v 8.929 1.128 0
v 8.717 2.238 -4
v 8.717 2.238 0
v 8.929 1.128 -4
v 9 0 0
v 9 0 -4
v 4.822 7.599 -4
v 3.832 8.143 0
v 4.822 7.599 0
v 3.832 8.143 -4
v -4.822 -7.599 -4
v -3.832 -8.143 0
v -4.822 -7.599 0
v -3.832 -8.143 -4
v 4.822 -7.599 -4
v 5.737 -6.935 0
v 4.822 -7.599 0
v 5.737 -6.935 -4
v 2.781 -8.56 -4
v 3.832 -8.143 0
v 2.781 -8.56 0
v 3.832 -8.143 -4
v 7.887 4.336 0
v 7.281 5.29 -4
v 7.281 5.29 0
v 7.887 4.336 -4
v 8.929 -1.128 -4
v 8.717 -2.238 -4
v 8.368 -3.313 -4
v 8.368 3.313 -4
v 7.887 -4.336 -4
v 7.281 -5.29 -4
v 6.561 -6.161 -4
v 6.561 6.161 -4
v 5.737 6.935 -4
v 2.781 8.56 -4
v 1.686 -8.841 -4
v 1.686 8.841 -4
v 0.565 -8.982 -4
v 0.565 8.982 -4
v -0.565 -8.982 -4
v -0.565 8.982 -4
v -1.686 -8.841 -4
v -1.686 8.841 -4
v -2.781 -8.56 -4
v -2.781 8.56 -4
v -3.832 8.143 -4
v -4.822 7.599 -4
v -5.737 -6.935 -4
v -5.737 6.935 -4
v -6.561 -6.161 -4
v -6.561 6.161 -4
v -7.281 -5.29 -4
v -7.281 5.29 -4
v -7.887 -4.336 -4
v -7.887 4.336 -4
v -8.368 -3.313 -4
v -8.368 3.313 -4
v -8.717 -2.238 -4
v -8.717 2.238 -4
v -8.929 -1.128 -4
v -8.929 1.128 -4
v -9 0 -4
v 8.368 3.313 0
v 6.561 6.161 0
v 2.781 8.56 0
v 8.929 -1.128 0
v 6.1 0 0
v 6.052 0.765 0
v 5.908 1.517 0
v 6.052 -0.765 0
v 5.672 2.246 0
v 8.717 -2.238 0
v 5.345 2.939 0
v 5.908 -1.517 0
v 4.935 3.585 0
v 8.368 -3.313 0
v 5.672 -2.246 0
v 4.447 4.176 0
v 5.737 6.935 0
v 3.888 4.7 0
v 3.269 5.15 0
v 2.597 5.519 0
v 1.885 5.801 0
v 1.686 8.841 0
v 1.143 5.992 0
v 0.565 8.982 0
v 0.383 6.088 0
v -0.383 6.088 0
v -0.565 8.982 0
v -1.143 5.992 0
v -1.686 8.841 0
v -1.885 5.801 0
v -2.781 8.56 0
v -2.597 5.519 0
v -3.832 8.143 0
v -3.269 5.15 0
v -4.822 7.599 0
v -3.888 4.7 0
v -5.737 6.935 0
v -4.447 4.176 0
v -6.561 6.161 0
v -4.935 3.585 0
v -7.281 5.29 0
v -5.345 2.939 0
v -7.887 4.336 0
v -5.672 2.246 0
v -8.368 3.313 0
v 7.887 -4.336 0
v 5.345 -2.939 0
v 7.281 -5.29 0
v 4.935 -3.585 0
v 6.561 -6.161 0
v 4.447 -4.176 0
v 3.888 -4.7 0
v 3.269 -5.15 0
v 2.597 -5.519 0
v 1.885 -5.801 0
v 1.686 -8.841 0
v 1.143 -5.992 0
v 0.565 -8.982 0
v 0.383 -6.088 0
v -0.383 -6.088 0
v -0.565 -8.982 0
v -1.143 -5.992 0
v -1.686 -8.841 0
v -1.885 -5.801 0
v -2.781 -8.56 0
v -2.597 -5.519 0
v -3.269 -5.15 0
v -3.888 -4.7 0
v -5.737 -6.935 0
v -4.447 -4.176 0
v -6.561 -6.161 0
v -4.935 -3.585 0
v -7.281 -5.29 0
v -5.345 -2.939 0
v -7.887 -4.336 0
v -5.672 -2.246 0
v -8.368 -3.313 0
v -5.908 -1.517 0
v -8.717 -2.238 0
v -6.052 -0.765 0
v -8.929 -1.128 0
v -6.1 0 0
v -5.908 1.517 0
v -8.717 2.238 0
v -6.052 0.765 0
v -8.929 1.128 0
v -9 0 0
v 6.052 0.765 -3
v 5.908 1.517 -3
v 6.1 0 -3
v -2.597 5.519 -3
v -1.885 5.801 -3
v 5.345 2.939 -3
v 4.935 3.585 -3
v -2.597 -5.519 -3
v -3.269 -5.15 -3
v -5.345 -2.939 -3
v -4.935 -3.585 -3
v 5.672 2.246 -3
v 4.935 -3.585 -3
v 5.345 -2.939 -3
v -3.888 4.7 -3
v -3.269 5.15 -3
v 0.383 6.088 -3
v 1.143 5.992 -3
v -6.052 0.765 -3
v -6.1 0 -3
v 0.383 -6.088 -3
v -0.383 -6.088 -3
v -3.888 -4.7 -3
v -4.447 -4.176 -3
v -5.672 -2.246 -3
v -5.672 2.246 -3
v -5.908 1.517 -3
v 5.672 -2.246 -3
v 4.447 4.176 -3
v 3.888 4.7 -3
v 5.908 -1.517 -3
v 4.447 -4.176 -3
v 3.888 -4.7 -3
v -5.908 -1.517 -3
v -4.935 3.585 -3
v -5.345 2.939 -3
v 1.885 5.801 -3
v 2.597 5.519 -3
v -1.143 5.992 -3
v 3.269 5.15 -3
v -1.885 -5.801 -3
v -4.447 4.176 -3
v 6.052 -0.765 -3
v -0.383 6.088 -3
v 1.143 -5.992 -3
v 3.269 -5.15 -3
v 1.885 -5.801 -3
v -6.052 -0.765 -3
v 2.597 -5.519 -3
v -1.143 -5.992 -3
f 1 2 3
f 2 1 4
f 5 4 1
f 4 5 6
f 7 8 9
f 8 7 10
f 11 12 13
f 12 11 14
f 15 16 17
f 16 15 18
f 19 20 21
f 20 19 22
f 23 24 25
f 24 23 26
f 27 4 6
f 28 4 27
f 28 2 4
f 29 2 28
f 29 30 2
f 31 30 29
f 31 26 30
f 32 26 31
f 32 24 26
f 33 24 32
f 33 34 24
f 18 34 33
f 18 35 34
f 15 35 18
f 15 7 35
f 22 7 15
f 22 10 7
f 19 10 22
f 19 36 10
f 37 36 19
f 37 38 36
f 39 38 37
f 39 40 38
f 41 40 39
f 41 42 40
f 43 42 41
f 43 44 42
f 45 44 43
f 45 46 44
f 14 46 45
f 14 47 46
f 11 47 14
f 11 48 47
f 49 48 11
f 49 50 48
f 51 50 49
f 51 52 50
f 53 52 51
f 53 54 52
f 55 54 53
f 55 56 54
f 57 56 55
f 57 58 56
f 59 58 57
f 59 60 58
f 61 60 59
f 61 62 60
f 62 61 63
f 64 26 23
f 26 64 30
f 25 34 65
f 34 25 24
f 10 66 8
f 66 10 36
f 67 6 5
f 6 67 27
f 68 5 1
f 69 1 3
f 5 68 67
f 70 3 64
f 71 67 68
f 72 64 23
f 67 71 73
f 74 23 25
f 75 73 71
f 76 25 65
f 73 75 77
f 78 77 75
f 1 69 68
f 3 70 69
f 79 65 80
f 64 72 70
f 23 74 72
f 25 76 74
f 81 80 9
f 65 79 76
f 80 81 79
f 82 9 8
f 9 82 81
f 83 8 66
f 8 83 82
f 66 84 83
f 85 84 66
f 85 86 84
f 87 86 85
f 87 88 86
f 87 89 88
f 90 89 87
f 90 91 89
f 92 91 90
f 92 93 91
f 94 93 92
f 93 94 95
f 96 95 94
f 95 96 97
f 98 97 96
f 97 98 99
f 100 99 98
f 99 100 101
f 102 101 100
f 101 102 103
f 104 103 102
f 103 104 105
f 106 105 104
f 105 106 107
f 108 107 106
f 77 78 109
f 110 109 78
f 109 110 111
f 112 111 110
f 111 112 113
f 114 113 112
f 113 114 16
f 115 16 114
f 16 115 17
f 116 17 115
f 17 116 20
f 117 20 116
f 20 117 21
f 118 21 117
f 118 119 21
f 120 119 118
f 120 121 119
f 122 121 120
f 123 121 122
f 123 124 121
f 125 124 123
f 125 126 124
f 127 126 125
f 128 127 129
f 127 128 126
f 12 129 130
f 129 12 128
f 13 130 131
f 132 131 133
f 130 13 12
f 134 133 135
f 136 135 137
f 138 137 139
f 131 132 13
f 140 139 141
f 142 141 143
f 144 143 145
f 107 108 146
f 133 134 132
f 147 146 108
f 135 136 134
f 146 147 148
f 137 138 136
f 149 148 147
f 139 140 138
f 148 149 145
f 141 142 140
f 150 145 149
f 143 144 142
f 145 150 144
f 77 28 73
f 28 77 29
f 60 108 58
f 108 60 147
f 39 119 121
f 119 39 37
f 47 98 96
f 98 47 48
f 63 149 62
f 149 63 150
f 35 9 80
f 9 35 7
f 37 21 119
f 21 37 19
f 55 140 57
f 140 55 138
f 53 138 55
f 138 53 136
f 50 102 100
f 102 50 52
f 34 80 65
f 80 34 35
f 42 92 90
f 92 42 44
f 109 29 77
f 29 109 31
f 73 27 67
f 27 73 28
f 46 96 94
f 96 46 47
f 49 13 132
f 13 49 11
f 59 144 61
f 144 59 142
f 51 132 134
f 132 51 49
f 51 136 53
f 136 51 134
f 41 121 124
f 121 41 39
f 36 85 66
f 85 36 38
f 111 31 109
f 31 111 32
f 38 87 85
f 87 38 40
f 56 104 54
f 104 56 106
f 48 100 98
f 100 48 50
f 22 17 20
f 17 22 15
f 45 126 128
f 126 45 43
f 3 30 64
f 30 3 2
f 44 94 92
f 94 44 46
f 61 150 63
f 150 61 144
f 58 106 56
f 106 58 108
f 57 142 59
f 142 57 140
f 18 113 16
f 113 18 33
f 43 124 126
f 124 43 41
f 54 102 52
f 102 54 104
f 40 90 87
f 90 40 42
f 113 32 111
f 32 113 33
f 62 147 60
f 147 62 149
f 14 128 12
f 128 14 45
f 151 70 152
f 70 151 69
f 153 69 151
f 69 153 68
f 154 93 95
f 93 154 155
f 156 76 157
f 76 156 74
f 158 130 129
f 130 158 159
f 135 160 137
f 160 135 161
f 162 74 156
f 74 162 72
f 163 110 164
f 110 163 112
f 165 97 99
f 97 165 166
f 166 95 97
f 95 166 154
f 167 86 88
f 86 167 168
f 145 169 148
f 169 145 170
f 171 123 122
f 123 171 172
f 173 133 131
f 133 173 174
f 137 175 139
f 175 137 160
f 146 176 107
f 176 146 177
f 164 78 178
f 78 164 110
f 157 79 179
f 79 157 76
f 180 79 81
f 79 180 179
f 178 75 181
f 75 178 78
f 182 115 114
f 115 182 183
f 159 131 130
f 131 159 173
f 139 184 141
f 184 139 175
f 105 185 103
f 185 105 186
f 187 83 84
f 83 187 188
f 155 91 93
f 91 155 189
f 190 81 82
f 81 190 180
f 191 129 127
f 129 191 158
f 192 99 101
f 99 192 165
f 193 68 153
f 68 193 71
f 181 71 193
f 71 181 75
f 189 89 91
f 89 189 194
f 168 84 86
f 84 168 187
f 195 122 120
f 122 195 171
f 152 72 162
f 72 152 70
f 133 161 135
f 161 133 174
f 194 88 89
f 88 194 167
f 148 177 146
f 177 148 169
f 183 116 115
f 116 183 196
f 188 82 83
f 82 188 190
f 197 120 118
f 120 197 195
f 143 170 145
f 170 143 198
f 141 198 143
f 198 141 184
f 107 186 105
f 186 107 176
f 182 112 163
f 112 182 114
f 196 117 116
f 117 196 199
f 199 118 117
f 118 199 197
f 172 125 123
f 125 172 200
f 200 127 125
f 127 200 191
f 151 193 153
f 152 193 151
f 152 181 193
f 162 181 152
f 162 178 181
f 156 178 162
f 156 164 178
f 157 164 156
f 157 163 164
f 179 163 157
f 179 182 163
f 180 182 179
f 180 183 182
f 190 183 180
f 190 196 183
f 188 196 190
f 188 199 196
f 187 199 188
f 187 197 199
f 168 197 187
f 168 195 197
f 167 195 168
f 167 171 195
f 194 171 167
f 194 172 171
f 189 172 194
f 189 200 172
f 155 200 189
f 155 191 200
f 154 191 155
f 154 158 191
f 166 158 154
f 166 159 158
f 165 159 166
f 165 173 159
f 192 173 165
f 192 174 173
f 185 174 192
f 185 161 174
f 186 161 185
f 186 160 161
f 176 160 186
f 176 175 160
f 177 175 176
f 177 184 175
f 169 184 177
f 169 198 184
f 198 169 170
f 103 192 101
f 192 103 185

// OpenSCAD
$fn = 50;


difference() {
	union() {
		translate(v = [0, 0, -4.0000000000]) {
			cylinder(h = 4, r = 9.0000000000);
		}
	}
	union() {
		#translate(v = [0, 0, -3.0000000000]) {
			cylinder(h = 3, r = 6.1000000000);
		}
	}
}
